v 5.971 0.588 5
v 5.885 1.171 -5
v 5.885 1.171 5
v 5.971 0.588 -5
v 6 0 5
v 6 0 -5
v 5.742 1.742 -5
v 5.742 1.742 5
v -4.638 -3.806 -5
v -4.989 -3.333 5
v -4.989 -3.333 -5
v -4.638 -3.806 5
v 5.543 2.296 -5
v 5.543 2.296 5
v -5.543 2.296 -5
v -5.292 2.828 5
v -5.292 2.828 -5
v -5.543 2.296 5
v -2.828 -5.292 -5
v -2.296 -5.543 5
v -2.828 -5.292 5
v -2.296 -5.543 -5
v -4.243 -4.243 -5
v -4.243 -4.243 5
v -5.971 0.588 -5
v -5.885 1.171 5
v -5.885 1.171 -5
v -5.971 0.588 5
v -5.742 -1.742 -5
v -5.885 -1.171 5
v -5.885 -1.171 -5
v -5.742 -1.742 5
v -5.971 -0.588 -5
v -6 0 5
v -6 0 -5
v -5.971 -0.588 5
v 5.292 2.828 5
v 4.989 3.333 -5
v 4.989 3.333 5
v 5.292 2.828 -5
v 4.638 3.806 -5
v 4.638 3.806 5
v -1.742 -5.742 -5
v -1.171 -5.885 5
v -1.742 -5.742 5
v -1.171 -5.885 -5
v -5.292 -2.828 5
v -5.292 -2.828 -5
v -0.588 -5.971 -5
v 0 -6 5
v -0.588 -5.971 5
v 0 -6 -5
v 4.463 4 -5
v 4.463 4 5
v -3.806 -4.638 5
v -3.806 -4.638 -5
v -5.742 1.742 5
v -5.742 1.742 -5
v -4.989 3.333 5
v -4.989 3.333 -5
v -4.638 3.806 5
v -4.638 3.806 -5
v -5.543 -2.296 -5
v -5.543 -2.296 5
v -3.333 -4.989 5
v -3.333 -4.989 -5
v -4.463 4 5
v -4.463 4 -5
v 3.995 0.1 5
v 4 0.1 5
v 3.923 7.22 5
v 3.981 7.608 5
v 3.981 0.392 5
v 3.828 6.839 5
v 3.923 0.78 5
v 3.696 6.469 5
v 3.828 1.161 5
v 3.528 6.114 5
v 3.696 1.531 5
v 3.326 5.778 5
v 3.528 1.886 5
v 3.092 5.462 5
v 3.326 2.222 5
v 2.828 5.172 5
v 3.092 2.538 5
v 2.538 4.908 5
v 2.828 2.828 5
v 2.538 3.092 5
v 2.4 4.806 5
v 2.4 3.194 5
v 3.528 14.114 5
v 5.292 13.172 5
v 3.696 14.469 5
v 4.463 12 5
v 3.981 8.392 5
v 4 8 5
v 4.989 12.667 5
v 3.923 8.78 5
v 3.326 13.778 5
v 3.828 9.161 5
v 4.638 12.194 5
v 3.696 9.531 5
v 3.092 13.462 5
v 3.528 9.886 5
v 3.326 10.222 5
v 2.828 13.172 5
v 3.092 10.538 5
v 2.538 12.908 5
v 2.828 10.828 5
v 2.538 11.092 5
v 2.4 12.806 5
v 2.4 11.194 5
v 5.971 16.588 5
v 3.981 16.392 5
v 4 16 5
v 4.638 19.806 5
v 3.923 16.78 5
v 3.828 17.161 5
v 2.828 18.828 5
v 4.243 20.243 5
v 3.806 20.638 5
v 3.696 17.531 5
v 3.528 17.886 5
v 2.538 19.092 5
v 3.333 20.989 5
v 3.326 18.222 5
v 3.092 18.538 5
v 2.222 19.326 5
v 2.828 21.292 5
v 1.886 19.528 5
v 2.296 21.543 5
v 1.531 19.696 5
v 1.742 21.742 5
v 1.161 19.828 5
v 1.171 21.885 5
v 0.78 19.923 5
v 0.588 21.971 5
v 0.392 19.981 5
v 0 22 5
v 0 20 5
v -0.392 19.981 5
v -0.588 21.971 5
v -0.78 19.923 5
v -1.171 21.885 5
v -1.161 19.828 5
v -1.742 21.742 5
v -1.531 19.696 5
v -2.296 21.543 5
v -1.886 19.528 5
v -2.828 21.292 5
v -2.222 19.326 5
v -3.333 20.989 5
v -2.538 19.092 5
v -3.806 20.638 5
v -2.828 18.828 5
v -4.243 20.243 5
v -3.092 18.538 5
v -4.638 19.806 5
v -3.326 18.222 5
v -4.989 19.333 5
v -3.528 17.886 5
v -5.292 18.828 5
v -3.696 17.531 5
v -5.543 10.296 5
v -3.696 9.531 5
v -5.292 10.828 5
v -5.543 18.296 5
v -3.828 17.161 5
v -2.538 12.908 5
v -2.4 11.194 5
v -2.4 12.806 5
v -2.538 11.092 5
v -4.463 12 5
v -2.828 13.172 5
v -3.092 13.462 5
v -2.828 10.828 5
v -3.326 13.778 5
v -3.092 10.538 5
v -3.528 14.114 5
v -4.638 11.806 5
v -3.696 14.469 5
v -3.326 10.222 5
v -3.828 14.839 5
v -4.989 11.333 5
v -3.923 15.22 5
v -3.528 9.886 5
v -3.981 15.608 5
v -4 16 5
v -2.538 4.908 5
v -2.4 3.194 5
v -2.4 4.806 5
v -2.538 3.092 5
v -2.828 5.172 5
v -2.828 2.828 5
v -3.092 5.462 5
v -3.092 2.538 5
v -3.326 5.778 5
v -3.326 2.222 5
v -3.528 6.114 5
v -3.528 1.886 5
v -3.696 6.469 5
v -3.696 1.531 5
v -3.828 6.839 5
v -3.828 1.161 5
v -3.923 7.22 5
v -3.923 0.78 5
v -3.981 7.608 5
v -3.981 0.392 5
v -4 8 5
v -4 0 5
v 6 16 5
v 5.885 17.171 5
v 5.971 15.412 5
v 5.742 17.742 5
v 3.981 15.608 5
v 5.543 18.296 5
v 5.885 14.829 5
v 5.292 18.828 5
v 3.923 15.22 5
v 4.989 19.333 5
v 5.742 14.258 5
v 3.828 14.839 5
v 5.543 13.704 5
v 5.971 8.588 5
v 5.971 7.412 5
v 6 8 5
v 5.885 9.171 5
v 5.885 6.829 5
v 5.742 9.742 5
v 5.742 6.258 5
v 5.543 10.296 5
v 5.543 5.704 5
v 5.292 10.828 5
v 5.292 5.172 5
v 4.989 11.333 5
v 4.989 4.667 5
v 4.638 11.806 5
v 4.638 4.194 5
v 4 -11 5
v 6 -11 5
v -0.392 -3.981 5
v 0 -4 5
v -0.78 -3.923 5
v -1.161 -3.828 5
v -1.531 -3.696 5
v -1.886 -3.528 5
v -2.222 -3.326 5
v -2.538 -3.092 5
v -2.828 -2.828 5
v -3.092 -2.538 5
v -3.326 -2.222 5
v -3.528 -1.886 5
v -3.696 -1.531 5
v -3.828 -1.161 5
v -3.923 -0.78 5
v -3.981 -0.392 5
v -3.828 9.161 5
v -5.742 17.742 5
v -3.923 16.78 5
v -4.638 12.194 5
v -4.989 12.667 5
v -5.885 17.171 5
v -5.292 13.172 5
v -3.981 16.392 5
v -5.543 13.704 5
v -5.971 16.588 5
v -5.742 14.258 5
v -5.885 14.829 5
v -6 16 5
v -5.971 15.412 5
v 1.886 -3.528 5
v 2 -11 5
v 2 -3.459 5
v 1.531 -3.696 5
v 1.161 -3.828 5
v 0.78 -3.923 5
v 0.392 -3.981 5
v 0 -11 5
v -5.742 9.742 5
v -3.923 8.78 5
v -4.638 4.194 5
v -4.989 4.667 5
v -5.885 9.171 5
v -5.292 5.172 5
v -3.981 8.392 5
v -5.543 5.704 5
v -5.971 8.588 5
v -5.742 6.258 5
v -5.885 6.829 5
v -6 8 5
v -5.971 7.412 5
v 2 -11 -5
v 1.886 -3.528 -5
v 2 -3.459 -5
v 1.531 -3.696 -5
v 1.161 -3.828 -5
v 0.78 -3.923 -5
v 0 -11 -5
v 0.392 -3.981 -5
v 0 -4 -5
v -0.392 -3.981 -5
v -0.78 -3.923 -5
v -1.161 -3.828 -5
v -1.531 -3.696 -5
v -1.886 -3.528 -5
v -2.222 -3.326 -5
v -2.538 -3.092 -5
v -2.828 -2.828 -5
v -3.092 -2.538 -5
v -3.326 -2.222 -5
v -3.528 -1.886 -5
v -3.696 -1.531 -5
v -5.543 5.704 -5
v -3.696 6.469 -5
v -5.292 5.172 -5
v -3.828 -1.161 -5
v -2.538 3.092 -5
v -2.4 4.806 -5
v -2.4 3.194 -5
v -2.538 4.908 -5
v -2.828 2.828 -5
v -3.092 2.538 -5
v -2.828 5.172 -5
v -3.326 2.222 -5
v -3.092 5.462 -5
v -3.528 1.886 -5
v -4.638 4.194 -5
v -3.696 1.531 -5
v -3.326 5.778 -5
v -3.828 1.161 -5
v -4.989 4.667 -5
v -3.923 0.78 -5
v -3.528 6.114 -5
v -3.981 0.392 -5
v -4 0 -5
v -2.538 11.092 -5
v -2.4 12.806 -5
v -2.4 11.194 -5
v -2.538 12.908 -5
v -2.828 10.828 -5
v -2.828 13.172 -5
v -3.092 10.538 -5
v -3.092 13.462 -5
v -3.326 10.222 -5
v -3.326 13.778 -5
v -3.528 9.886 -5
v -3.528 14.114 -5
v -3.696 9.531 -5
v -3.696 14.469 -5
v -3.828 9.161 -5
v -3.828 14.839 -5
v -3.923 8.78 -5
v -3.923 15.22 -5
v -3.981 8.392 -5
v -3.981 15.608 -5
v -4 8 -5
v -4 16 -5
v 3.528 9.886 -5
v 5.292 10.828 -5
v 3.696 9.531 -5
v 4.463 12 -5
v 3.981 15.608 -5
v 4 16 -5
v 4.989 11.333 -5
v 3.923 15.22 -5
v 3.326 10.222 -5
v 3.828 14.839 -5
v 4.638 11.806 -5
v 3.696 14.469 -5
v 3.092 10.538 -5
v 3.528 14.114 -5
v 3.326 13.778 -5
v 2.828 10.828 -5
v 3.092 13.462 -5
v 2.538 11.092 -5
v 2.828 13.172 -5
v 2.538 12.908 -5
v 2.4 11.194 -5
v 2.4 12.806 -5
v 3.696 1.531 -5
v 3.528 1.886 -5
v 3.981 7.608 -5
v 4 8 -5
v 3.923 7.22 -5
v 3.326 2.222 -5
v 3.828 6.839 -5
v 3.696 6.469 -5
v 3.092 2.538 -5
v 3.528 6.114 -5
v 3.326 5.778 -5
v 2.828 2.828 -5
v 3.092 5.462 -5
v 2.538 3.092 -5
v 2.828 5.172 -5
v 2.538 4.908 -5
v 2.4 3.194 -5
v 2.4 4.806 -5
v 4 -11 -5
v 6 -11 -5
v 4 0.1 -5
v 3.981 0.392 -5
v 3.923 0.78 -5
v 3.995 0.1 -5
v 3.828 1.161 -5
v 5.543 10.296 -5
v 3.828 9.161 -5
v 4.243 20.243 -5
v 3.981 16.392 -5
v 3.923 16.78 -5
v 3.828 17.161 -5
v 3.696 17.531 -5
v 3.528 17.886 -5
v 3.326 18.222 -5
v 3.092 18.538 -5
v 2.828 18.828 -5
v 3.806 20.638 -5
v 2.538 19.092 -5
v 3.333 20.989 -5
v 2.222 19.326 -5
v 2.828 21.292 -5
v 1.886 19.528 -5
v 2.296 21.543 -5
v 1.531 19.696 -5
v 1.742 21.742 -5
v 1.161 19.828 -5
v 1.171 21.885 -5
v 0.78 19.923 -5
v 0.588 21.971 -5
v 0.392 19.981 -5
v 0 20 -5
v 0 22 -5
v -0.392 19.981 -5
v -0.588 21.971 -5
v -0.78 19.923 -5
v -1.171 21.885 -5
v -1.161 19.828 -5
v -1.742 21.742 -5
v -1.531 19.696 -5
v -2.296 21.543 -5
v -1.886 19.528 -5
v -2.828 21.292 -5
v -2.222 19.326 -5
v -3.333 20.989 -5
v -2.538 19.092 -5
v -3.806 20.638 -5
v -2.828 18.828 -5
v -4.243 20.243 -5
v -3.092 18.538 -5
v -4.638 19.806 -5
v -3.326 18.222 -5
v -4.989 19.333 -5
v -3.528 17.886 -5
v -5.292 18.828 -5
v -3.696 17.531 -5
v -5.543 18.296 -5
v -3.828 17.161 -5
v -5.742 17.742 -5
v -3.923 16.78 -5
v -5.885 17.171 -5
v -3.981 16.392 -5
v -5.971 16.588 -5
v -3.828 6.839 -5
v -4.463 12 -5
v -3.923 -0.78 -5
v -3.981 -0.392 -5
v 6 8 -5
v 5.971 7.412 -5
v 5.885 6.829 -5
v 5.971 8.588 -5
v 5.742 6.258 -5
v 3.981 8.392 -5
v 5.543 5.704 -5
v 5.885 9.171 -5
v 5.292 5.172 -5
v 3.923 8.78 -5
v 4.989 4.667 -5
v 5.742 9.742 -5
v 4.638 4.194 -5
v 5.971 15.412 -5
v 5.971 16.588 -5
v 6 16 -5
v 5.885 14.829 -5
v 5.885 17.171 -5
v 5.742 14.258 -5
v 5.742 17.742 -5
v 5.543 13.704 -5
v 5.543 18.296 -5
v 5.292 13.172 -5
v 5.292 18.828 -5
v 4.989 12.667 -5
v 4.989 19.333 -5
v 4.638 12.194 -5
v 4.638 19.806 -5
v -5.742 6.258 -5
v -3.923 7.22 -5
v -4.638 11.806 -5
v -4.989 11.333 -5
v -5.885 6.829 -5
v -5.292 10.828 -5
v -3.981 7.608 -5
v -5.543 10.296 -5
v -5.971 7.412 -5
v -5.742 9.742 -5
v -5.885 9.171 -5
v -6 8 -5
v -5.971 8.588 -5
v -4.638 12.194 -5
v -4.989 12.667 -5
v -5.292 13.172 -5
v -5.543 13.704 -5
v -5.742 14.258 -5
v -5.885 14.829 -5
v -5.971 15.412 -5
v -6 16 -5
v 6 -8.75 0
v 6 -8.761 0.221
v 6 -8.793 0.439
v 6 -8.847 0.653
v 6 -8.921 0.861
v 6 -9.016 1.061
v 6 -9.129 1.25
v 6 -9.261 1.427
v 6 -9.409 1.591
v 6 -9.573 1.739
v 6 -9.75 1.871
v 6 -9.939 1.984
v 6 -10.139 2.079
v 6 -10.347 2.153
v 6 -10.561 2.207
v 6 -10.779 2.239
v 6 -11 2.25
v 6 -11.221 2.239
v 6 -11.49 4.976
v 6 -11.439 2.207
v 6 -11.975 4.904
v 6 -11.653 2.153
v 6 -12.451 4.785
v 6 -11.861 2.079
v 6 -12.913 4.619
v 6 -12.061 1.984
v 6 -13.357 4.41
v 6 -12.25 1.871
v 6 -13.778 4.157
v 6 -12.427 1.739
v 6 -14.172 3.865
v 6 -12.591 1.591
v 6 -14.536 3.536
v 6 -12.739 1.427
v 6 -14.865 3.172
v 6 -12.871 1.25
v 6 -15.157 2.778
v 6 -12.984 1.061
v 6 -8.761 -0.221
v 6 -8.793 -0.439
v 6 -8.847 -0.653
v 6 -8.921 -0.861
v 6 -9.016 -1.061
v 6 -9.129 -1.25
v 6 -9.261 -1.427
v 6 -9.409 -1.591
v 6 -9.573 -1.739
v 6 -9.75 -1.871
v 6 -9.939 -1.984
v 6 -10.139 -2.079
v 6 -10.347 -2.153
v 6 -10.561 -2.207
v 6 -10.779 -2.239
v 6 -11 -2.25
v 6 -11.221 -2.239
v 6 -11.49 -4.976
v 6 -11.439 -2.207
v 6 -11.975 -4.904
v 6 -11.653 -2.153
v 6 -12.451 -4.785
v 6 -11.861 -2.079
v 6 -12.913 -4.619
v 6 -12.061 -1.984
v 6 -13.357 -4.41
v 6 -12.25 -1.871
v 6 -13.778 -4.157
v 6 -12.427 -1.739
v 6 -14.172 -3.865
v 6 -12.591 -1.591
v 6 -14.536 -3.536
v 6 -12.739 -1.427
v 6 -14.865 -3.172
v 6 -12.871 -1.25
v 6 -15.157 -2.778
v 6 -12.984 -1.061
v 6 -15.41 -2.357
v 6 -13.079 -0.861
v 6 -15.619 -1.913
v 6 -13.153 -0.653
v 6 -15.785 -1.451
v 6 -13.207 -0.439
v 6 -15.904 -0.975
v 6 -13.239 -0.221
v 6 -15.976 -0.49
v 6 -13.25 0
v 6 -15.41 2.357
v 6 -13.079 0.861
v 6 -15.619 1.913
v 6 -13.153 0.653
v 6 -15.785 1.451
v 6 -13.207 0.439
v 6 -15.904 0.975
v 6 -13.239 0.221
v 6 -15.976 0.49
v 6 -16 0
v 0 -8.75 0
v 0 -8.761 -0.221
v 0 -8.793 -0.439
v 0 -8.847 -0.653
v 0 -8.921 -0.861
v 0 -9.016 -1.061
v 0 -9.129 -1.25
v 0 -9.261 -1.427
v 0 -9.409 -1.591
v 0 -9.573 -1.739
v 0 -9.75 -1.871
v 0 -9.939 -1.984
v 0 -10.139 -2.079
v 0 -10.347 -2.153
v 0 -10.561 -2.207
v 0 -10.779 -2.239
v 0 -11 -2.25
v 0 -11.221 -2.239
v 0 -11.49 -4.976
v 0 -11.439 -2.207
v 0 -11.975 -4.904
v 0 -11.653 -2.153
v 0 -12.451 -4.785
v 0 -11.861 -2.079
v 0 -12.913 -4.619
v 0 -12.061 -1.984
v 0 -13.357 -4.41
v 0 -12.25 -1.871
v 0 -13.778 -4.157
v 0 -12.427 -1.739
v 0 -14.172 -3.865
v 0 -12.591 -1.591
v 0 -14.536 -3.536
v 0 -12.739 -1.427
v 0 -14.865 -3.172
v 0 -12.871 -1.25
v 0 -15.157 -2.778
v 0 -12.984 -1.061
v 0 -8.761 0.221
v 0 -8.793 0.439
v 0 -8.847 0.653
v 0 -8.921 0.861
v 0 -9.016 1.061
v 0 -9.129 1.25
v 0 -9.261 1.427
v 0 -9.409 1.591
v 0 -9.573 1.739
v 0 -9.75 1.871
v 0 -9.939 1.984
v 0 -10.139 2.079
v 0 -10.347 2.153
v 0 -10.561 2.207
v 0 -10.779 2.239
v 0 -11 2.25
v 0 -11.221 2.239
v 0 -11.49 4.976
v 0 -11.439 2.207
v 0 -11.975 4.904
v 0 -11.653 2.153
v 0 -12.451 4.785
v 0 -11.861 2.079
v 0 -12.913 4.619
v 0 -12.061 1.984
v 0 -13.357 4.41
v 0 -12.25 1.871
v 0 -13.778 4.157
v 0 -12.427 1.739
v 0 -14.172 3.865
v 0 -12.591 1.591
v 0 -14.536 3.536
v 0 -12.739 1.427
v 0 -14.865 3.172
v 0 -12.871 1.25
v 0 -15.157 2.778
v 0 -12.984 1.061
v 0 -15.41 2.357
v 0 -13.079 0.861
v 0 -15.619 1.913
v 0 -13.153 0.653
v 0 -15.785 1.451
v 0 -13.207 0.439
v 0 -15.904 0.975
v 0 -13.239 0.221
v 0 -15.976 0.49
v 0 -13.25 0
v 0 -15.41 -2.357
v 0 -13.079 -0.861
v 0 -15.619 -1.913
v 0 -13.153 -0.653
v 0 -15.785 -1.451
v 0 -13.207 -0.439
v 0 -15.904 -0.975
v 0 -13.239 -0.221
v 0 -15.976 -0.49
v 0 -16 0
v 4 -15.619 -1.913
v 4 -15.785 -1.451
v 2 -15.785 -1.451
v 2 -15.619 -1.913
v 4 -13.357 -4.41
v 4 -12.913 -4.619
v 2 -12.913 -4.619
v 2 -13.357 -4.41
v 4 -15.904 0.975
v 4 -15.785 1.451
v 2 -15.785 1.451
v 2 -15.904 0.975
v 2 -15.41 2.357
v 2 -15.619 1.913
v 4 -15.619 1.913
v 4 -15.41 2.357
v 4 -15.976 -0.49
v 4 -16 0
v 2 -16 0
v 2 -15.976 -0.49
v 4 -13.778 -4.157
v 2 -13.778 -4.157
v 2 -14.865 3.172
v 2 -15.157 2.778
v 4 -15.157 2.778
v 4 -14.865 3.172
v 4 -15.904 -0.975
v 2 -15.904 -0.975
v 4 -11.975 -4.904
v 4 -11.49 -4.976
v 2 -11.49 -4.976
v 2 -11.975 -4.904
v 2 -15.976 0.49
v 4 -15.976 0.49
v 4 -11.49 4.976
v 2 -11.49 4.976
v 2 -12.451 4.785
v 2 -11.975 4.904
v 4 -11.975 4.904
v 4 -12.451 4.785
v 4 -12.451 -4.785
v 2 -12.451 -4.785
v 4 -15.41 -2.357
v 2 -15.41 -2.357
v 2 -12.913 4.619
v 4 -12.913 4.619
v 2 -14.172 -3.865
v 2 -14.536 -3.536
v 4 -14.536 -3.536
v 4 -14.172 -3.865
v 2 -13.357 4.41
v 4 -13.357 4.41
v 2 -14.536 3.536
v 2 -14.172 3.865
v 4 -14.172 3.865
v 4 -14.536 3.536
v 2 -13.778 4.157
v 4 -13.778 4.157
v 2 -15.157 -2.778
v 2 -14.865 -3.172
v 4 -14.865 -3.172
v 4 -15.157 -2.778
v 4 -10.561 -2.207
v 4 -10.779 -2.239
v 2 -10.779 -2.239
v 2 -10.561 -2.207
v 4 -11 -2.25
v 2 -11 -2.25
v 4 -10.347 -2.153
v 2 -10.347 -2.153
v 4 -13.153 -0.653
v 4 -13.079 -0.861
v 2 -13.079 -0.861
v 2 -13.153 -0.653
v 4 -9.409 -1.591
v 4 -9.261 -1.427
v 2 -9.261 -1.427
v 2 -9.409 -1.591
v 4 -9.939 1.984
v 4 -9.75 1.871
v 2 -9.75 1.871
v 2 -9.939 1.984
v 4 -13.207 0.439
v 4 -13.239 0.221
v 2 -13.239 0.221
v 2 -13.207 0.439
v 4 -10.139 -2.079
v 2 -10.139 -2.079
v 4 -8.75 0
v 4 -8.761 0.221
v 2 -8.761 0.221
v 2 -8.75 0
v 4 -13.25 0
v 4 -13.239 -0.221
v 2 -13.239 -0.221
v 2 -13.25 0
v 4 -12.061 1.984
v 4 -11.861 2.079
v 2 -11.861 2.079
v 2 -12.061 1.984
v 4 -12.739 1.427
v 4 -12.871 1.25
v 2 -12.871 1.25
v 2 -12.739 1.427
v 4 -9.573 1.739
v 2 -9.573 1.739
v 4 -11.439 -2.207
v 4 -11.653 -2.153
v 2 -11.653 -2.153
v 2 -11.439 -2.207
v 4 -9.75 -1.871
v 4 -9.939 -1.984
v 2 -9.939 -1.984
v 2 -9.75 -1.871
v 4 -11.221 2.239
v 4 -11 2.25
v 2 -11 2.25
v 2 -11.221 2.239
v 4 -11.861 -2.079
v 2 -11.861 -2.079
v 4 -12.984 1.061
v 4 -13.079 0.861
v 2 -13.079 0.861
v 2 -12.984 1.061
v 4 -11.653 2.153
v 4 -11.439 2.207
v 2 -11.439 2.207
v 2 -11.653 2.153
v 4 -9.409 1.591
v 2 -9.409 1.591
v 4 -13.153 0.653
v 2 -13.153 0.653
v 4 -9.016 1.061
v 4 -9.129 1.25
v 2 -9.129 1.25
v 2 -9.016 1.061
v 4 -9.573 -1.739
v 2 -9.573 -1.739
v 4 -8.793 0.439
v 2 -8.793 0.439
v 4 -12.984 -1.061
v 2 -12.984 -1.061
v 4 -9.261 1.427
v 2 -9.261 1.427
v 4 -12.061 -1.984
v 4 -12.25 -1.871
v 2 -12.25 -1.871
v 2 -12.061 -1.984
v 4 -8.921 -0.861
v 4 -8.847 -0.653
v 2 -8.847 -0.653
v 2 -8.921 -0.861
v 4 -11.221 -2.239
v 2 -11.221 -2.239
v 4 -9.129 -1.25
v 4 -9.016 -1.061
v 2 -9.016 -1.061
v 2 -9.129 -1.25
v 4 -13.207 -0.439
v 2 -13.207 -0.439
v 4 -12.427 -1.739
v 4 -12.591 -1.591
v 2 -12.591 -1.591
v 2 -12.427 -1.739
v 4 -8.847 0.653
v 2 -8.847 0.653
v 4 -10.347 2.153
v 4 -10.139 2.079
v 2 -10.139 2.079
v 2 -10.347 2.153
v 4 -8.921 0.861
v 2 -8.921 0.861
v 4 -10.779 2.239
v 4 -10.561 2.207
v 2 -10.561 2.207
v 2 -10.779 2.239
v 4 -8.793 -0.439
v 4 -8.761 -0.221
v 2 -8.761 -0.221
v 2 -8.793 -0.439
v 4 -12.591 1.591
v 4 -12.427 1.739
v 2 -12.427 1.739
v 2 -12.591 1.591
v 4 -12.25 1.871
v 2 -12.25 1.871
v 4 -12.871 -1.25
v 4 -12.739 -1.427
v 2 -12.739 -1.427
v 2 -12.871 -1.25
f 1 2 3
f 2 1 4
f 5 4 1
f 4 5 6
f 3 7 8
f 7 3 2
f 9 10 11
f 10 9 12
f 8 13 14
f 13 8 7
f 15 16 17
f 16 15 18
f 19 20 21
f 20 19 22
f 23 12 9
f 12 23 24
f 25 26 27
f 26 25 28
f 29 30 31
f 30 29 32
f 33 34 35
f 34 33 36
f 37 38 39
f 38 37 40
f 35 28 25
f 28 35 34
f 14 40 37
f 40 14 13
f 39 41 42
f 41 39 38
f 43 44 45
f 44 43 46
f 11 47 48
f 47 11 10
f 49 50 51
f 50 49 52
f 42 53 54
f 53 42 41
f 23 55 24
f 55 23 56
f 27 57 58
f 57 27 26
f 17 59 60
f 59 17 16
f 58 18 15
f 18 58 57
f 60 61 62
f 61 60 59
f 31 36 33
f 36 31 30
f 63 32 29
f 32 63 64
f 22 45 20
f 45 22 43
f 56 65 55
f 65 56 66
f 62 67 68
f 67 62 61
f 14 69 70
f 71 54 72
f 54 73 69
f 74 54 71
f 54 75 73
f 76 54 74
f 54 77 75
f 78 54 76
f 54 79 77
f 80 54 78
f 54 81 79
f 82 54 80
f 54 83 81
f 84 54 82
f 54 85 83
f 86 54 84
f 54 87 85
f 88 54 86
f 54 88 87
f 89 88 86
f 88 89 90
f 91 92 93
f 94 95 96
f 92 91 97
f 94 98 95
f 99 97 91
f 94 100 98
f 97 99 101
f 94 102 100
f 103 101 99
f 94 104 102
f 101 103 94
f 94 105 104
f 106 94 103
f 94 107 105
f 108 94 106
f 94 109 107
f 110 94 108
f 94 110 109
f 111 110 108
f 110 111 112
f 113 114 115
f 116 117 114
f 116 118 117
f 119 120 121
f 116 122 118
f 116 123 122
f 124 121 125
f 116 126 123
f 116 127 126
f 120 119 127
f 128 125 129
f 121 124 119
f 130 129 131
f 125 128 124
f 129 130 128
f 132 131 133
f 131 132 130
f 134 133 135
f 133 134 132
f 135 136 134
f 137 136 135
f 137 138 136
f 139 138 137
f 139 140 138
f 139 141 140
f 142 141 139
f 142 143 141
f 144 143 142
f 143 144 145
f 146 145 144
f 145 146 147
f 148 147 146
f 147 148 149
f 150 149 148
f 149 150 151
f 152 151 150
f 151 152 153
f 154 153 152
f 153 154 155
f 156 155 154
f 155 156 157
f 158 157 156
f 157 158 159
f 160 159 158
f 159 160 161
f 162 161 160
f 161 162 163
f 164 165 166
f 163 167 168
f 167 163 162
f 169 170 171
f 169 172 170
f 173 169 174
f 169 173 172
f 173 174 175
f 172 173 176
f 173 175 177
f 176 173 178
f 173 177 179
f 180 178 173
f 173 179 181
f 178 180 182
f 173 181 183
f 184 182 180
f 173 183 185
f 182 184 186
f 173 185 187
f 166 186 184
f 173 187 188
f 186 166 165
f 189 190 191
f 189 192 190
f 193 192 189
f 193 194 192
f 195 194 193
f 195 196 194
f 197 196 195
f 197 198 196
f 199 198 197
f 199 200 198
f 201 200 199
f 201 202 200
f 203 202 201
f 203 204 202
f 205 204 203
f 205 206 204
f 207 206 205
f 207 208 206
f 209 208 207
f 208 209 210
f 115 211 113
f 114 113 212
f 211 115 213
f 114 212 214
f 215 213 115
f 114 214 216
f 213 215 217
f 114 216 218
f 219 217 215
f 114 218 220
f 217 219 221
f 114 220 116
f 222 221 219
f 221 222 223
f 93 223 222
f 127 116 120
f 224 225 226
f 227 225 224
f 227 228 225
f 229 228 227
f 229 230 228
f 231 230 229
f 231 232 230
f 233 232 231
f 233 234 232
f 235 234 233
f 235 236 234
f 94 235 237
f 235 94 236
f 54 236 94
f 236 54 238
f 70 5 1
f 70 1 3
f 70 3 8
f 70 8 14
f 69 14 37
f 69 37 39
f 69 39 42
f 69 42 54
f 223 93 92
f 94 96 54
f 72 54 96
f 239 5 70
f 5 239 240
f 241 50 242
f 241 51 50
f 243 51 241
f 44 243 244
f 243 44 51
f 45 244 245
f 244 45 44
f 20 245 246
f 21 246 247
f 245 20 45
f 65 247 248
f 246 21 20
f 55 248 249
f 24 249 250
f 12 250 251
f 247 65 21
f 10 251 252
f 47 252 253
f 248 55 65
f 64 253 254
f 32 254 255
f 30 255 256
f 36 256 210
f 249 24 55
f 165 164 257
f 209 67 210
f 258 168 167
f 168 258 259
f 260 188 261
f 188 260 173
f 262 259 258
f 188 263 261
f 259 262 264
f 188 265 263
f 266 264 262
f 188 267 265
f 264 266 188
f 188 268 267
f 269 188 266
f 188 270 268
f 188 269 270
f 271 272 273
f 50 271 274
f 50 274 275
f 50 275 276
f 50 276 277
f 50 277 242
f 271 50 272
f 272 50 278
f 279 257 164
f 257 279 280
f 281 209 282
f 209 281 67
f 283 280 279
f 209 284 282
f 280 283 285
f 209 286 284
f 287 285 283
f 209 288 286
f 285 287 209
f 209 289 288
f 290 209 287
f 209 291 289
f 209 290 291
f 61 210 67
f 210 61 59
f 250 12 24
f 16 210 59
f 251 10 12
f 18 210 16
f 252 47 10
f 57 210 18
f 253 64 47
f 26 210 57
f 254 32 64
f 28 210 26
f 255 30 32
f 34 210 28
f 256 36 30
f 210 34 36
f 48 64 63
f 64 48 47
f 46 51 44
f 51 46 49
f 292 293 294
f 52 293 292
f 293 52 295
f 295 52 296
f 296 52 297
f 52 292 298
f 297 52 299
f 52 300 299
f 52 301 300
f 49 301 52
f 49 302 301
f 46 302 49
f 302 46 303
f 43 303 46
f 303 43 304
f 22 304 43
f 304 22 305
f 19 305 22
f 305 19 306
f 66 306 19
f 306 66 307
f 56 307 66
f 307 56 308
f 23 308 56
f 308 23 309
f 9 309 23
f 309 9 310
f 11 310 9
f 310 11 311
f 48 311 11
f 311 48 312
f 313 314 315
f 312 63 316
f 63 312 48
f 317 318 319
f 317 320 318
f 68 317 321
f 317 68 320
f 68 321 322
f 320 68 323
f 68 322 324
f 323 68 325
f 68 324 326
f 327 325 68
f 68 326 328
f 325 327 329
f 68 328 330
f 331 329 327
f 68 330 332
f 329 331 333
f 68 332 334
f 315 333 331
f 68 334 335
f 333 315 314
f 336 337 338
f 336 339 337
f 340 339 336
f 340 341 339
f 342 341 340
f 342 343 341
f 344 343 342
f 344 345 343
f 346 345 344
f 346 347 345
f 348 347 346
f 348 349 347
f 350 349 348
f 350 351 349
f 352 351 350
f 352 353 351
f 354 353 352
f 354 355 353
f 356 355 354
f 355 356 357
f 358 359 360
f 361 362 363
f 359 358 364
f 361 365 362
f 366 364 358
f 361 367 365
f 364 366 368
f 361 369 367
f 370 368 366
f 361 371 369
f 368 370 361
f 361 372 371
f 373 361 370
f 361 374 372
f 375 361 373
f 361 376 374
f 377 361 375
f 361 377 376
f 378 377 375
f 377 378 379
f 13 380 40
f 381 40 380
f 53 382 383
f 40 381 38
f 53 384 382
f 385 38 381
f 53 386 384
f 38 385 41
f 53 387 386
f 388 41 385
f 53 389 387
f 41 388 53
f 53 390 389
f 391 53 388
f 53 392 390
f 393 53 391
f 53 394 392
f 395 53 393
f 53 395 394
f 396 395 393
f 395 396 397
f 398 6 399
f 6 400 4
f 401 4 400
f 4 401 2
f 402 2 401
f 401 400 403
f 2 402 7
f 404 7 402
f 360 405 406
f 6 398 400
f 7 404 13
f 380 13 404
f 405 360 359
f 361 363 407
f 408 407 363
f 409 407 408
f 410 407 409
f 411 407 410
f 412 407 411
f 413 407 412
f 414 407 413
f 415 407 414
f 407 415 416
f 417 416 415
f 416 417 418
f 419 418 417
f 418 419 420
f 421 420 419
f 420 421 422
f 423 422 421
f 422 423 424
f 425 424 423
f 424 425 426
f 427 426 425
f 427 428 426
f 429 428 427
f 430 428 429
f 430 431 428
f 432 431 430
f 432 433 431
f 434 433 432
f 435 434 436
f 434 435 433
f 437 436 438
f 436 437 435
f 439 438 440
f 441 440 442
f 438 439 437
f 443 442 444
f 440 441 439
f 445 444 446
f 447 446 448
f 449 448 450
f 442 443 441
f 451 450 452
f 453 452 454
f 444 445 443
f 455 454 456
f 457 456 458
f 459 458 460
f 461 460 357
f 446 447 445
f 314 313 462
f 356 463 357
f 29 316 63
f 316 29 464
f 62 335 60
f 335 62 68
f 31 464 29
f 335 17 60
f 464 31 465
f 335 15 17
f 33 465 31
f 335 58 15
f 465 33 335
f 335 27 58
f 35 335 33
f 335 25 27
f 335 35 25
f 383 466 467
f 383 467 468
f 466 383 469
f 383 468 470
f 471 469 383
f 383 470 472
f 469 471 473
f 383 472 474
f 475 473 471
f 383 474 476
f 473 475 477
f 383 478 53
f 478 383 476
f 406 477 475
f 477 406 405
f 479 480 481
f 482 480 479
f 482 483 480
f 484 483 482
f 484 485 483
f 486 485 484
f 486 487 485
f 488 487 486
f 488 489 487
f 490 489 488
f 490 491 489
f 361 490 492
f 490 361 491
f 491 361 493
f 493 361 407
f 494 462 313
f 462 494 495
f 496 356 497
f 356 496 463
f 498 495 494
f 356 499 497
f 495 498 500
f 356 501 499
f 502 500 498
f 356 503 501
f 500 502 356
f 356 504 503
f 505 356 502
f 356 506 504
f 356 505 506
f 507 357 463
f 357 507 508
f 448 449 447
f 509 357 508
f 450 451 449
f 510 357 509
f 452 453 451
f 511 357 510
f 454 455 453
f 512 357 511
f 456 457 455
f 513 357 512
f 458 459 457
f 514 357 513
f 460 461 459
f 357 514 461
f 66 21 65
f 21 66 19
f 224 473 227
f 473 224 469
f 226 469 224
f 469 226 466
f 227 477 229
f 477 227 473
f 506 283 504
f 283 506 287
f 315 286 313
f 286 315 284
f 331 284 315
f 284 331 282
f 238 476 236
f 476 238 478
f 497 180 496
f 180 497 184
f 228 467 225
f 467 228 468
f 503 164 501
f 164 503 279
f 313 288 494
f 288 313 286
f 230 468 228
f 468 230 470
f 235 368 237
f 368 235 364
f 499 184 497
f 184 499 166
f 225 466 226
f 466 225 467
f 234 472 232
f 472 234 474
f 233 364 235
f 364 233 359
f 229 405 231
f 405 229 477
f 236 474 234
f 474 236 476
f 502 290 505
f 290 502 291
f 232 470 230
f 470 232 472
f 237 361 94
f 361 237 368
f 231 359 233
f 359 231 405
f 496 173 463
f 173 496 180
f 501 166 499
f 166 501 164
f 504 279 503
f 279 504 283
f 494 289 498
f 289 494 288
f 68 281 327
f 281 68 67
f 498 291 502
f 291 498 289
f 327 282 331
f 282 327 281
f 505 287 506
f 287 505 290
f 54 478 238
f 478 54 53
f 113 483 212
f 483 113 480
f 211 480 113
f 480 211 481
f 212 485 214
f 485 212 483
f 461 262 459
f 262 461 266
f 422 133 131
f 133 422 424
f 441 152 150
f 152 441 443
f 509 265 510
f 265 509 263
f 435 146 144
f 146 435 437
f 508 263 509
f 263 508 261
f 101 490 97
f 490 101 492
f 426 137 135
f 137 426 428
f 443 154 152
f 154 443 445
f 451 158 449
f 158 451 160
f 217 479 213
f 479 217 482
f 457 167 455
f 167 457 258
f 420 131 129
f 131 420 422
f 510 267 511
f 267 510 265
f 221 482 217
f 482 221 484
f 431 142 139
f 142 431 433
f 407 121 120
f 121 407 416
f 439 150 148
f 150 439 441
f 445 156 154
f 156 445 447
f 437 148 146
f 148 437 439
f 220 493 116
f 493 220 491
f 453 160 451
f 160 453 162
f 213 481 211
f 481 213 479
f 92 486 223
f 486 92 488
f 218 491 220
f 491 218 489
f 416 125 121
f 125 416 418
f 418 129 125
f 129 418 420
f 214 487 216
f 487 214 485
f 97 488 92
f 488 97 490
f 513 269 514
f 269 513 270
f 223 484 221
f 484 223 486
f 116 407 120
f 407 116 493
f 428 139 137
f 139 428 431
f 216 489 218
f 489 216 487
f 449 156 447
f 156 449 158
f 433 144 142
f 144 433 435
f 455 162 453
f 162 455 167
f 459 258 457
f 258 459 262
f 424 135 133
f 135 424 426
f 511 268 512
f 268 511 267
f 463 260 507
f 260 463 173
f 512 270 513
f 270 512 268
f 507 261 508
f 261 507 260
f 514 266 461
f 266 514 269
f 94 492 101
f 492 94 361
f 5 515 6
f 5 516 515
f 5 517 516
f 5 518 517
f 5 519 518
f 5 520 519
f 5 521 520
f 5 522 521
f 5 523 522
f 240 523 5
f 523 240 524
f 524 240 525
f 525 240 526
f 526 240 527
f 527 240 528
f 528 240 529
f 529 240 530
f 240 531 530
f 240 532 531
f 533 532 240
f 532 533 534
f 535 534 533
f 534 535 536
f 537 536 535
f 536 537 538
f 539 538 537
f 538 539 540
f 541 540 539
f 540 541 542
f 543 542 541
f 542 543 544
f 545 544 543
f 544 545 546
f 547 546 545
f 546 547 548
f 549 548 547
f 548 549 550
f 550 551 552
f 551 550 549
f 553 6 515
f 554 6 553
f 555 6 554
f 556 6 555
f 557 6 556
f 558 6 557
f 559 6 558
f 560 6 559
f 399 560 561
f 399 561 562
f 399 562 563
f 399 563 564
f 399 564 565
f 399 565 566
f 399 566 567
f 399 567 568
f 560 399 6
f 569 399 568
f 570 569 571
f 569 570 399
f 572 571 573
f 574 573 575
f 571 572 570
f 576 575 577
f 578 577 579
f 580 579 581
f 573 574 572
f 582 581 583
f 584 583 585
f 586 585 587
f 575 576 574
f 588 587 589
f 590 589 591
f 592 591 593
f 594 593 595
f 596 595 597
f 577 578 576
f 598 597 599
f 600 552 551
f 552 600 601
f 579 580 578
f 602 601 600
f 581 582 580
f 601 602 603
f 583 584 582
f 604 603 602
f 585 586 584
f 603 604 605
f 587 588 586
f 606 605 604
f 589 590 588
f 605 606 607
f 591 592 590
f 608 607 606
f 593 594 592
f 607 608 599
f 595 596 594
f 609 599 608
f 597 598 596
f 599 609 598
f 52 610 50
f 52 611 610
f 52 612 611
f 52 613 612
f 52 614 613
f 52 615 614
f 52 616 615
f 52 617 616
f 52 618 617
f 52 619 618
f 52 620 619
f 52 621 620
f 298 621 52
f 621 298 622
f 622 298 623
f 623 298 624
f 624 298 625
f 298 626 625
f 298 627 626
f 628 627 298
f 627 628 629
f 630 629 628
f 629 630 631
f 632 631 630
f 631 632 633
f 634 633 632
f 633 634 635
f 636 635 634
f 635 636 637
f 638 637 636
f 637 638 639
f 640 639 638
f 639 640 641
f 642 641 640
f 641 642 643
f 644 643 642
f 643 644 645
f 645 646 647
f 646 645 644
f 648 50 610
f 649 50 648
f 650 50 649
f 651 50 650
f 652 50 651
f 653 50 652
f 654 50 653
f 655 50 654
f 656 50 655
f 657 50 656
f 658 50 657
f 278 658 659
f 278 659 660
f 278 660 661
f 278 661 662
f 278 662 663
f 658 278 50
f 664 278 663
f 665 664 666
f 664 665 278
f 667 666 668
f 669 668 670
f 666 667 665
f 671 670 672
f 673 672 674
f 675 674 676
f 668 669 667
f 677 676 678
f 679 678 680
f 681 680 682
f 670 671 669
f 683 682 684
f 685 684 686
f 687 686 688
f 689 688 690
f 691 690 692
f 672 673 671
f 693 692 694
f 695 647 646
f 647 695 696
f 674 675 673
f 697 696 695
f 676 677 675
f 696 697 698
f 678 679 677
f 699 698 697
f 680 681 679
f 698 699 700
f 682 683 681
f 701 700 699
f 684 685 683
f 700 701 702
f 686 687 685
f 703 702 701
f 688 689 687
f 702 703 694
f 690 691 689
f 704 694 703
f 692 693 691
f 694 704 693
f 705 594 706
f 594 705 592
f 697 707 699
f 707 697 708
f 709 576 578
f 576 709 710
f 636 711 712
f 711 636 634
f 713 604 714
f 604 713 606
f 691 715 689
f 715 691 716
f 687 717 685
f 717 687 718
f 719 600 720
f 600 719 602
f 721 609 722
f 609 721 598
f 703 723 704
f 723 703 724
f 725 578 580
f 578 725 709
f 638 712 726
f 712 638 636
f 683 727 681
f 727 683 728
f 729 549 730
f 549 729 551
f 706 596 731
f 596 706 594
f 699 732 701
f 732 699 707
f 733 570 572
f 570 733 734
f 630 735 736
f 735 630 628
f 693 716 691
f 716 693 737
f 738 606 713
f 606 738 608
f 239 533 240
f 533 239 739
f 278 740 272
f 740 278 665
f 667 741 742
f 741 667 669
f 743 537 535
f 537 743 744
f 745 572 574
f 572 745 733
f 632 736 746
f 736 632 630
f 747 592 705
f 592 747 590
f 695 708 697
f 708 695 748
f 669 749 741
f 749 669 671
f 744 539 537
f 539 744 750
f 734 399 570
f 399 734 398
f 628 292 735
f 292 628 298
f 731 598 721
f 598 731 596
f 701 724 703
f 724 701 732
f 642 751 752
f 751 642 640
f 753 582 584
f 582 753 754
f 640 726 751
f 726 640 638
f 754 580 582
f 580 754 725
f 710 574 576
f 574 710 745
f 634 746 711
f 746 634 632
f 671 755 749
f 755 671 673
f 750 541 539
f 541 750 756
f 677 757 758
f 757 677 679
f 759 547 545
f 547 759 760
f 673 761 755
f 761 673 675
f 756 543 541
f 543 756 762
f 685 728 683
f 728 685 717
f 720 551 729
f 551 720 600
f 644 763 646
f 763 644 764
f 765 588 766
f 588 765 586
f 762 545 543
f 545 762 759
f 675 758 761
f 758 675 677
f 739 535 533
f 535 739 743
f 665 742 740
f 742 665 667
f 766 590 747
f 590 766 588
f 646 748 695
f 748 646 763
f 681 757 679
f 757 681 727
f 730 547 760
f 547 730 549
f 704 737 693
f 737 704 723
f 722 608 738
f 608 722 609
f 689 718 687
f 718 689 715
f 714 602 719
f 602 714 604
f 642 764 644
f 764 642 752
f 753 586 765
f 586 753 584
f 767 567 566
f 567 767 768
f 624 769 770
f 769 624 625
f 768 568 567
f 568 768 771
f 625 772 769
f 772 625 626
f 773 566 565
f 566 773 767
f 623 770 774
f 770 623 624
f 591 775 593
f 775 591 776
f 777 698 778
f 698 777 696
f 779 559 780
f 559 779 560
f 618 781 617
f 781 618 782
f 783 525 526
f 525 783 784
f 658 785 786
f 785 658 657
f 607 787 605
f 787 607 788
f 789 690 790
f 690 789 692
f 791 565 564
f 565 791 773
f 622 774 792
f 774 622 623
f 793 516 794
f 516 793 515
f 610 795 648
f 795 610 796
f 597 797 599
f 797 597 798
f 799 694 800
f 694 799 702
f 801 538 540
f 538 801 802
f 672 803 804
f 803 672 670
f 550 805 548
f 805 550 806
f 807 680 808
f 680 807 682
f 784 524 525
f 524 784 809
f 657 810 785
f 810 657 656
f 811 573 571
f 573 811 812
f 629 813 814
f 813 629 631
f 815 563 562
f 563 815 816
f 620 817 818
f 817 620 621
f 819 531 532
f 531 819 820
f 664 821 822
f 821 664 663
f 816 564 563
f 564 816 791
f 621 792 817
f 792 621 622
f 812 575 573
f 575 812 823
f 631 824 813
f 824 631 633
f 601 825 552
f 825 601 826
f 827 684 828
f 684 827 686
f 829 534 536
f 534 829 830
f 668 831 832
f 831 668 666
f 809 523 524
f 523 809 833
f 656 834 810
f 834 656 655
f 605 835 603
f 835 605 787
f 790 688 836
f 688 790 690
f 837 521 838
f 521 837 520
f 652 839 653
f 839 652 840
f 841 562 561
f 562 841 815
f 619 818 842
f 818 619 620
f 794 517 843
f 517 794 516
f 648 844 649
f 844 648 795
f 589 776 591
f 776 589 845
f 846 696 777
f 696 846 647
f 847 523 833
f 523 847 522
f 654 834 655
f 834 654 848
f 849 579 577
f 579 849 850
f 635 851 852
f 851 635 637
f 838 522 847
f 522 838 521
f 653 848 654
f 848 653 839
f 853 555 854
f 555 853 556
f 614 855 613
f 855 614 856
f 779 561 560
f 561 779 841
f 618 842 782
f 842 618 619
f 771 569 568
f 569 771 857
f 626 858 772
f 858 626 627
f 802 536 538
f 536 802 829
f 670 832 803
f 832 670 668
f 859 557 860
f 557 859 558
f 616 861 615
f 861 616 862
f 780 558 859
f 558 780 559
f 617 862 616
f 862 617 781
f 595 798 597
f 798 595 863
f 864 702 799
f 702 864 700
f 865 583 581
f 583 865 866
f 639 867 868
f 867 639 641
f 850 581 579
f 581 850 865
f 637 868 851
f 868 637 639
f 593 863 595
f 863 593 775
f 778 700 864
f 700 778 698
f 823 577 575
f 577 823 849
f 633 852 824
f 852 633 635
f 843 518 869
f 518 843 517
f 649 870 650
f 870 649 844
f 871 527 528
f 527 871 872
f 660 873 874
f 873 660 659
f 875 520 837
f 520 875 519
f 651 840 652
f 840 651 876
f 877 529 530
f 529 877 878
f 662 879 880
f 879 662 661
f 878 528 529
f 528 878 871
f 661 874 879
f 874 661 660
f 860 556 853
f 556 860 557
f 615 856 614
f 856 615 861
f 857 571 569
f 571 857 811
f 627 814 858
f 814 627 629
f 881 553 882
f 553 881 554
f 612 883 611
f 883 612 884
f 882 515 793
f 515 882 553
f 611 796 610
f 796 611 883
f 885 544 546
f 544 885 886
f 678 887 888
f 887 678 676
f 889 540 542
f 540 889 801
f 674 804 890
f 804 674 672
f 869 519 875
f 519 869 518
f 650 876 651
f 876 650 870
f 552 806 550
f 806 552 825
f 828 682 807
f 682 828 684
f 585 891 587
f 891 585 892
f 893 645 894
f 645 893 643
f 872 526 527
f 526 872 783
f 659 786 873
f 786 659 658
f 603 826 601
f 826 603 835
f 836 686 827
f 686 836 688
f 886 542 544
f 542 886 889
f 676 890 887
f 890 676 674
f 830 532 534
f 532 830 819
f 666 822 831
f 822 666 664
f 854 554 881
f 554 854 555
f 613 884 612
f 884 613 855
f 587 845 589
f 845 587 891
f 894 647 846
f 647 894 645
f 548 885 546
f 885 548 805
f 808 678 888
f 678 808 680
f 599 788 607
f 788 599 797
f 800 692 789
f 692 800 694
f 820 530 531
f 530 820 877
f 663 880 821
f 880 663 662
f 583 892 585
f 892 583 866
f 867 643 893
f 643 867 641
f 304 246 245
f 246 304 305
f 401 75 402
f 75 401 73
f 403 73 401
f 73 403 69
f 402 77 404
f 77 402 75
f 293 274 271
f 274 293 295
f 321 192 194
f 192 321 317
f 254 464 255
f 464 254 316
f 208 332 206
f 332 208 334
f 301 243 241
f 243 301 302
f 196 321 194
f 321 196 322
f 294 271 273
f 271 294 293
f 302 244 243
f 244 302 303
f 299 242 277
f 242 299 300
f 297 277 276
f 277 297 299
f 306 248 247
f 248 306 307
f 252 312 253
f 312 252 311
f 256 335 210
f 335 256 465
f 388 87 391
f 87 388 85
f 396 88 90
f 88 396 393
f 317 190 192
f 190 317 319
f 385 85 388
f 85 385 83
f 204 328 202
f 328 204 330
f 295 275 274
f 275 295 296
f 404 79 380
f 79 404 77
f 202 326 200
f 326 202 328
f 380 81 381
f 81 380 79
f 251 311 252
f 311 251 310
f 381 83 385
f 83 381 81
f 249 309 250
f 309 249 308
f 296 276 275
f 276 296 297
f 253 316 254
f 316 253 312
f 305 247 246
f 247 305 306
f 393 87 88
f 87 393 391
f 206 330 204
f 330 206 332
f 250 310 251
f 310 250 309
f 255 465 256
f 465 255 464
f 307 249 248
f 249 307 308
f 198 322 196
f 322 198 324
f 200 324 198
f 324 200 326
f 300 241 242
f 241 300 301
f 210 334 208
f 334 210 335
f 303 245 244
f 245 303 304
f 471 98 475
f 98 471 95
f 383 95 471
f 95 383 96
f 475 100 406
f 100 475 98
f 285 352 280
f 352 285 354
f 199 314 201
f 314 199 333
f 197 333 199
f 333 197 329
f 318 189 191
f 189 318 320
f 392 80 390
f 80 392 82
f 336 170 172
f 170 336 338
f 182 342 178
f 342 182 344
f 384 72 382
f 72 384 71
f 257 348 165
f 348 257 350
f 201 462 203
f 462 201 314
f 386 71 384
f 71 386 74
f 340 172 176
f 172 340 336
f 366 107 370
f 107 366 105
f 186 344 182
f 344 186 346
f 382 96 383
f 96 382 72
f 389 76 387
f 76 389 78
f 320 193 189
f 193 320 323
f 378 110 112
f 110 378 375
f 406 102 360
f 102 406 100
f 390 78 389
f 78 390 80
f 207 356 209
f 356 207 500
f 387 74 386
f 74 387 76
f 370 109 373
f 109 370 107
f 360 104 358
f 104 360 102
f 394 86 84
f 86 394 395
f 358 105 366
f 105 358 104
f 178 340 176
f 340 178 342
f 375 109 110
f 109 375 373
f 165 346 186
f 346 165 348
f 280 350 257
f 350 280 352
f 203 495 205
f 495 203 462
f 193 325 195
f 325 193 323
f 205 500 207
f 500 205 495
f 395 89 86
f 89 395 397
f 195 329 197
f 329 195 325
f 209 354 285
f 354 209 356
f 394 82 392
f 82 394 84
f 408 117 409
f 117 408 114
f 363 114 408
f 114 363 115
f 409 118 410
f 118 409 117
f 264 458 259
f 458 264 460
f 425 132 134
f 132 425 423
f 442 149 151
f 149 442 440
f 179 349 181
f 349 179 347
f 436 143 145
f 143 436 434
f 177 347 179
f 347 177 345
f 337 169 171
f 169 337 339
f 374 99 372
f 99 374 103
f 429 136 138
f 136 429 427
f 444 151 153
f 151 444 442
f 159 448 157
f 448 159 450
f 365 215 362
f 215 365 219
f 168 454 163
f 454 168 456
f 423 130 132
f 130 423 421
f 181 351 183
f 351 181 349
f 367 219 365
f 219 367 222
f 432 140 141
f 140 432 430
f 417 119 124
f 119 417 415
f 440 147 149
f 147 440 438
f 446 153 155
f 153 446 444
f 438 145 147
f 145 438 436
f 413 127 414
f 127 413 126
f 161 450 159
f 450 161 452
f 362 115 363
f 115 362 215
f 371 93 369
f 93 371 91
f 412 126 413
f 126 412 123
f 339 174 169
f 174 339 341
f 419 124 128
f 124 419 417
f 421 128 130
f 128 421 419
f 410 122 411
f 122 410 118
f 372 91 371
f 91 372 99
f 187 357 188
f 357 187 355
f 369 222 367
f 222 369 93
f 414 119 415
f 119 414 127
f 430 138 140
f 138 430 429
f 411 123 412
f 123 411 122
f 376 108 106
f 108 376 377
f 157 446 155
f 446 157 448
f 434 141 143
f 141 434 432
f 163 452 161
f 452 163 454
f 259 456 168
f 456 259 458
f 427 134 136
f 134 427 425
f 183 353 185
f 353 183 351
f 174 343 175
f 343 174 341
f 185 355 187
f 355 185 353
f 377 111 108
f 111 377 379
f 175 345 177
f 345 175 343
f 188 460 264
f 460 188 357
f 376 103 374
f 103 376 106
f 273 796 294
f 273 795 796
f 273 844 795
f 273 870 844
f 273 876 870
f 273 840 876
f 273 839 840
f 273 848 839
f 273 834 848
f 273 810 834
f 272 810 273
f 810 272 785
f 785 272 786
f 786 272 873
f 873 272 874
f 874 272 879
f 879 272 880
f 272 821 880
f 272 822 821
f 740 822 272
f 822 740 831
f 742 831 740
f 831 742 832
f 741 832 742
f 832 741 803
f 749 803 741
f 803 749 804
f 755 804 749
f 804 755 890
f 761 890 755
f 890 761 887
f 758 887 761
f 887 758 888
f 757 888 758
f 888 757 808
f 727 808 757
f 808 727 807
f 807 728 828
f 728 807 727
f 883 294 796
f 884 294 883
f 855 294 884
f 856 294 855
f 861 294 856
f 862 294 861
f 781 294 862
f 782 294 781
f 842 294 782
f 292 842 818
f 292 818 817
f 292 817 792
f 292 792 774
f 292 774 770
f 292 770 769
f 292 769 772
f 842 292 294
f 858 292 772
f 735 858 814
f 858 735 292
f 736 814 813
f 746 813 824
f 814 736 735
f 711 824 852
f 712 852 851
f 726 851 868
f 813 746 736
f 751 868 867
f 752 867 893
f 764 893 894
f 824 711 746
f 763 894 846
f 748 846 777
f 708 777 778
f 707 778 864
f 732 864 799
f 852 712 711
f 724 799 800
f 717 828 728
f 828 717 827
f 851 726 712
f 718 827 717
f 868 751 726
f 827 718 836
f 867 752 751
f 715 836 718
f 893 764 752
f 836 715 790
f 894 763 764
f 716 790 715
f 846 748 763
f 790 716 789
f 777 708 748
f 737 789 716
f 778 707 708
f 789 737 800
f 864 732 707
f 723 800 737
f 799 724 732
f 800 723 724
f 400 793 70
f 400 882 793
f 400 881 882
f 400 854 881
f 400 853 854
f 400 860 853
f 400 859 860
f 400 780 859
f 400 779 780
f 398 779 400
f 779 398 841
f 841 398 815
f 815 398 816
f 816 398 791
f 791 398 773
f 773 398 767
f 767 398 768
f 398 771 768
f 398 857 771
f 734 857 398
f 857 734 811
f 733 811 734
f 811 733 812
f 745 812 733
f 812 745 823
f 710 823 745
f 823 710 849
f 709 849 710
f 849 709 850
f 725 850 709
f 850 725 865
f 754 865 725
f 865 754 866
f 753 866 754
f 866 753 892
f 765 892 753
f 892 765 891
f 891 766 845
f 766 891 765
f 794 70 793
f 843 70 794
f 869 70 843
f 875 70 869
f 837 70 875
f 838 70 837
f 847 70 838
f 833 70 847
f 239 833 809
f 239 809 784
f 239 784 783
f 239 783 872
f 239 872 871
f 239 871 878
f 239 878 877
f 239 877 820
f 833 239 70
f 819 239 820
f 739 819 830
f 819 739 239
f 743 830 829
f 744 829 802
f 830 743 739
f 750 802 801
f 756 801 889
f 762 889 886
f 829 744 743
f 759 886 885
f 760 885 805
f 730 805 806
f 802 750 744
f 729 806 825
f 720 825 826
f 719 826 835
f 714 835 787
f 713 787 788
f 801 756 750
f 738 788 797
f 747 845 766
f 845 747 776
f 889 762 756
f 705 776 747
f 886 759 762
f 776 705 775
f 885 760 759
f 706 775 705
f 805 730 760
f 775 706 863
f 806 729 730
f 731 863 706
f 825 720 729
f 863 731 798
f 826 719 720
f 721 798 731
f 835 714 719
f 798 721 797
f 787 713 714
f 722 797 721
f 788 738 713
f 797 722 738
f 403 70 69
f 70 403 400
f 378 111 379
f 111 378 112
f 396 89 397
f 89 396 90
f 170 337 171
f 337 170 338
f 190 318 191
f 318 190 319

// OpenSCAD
// Customizable cable clip
// by Frederic RIBLE F1OAT / 2018/11/05

cables_count = 3; // [1:10]

// (in mm)
cables_diameter = 8;

// (in mm)
cables_spacing = 0;

// (in mm)
thickness = 2;

// (in mm)
gap = 2;

// (in mm)
width = 10;

// (in mm)
screw_diameter = 4.5;


// Following variables are not parameters
epsilon = 0.1+0;
$fn=64+0;

outer = cables_diameter+2*thickness;

module clip() {
    difference() {
        union() {
            for (c=[0:cables_count-1]) {
                translate([0,c*(cables_diameter+cables_spacing),0]) {
                    cylinder(h=width, d=outer, center=true);
                }
            }
            translate([outer/2-thickness-gap/2, -width/2-outer/2, 0]) {
                rotate([0, 90, 0]) {
                    bracket();
                }
            }
        }
        cut = width+outer/2;
        translate([outer/2-thickness, -cut-epsilon, -width/2-epsilon]) {
            rotate([0, -90, 0]) {
                cube([width+2*epsilon, cut+2*epsilon, gap]);
            }
        }
        for (c=[0:cables_count-1]) {
            translate([0,c*(cables_diameter+cables_spacing),0]) {
                cylinder(h=width+epsilon, d=cables_diameter, center=true);
            }
        }
        ll = (cables_count-1)*(cables_diameter+cables_spacing);
        translate([0,ll/2,0]) {
            cube([cables_diameter*0.6, ll, width+2*epsilon], center=true);
        }
    }
}

module bracket() {
    difference() {
        union() {
            translate([-width/2, 0, -thickness-gap/2]) {
                cube([width, width/2+outer/2, 2*thickness+gap]);
            }
            cylinder(h=2*thickness+gap, d=width, center=true);
        }
        cylinder(h=2*thickness+gap+2*epsilon, d=screw_diameter, center=true);
    }
}

clip();
